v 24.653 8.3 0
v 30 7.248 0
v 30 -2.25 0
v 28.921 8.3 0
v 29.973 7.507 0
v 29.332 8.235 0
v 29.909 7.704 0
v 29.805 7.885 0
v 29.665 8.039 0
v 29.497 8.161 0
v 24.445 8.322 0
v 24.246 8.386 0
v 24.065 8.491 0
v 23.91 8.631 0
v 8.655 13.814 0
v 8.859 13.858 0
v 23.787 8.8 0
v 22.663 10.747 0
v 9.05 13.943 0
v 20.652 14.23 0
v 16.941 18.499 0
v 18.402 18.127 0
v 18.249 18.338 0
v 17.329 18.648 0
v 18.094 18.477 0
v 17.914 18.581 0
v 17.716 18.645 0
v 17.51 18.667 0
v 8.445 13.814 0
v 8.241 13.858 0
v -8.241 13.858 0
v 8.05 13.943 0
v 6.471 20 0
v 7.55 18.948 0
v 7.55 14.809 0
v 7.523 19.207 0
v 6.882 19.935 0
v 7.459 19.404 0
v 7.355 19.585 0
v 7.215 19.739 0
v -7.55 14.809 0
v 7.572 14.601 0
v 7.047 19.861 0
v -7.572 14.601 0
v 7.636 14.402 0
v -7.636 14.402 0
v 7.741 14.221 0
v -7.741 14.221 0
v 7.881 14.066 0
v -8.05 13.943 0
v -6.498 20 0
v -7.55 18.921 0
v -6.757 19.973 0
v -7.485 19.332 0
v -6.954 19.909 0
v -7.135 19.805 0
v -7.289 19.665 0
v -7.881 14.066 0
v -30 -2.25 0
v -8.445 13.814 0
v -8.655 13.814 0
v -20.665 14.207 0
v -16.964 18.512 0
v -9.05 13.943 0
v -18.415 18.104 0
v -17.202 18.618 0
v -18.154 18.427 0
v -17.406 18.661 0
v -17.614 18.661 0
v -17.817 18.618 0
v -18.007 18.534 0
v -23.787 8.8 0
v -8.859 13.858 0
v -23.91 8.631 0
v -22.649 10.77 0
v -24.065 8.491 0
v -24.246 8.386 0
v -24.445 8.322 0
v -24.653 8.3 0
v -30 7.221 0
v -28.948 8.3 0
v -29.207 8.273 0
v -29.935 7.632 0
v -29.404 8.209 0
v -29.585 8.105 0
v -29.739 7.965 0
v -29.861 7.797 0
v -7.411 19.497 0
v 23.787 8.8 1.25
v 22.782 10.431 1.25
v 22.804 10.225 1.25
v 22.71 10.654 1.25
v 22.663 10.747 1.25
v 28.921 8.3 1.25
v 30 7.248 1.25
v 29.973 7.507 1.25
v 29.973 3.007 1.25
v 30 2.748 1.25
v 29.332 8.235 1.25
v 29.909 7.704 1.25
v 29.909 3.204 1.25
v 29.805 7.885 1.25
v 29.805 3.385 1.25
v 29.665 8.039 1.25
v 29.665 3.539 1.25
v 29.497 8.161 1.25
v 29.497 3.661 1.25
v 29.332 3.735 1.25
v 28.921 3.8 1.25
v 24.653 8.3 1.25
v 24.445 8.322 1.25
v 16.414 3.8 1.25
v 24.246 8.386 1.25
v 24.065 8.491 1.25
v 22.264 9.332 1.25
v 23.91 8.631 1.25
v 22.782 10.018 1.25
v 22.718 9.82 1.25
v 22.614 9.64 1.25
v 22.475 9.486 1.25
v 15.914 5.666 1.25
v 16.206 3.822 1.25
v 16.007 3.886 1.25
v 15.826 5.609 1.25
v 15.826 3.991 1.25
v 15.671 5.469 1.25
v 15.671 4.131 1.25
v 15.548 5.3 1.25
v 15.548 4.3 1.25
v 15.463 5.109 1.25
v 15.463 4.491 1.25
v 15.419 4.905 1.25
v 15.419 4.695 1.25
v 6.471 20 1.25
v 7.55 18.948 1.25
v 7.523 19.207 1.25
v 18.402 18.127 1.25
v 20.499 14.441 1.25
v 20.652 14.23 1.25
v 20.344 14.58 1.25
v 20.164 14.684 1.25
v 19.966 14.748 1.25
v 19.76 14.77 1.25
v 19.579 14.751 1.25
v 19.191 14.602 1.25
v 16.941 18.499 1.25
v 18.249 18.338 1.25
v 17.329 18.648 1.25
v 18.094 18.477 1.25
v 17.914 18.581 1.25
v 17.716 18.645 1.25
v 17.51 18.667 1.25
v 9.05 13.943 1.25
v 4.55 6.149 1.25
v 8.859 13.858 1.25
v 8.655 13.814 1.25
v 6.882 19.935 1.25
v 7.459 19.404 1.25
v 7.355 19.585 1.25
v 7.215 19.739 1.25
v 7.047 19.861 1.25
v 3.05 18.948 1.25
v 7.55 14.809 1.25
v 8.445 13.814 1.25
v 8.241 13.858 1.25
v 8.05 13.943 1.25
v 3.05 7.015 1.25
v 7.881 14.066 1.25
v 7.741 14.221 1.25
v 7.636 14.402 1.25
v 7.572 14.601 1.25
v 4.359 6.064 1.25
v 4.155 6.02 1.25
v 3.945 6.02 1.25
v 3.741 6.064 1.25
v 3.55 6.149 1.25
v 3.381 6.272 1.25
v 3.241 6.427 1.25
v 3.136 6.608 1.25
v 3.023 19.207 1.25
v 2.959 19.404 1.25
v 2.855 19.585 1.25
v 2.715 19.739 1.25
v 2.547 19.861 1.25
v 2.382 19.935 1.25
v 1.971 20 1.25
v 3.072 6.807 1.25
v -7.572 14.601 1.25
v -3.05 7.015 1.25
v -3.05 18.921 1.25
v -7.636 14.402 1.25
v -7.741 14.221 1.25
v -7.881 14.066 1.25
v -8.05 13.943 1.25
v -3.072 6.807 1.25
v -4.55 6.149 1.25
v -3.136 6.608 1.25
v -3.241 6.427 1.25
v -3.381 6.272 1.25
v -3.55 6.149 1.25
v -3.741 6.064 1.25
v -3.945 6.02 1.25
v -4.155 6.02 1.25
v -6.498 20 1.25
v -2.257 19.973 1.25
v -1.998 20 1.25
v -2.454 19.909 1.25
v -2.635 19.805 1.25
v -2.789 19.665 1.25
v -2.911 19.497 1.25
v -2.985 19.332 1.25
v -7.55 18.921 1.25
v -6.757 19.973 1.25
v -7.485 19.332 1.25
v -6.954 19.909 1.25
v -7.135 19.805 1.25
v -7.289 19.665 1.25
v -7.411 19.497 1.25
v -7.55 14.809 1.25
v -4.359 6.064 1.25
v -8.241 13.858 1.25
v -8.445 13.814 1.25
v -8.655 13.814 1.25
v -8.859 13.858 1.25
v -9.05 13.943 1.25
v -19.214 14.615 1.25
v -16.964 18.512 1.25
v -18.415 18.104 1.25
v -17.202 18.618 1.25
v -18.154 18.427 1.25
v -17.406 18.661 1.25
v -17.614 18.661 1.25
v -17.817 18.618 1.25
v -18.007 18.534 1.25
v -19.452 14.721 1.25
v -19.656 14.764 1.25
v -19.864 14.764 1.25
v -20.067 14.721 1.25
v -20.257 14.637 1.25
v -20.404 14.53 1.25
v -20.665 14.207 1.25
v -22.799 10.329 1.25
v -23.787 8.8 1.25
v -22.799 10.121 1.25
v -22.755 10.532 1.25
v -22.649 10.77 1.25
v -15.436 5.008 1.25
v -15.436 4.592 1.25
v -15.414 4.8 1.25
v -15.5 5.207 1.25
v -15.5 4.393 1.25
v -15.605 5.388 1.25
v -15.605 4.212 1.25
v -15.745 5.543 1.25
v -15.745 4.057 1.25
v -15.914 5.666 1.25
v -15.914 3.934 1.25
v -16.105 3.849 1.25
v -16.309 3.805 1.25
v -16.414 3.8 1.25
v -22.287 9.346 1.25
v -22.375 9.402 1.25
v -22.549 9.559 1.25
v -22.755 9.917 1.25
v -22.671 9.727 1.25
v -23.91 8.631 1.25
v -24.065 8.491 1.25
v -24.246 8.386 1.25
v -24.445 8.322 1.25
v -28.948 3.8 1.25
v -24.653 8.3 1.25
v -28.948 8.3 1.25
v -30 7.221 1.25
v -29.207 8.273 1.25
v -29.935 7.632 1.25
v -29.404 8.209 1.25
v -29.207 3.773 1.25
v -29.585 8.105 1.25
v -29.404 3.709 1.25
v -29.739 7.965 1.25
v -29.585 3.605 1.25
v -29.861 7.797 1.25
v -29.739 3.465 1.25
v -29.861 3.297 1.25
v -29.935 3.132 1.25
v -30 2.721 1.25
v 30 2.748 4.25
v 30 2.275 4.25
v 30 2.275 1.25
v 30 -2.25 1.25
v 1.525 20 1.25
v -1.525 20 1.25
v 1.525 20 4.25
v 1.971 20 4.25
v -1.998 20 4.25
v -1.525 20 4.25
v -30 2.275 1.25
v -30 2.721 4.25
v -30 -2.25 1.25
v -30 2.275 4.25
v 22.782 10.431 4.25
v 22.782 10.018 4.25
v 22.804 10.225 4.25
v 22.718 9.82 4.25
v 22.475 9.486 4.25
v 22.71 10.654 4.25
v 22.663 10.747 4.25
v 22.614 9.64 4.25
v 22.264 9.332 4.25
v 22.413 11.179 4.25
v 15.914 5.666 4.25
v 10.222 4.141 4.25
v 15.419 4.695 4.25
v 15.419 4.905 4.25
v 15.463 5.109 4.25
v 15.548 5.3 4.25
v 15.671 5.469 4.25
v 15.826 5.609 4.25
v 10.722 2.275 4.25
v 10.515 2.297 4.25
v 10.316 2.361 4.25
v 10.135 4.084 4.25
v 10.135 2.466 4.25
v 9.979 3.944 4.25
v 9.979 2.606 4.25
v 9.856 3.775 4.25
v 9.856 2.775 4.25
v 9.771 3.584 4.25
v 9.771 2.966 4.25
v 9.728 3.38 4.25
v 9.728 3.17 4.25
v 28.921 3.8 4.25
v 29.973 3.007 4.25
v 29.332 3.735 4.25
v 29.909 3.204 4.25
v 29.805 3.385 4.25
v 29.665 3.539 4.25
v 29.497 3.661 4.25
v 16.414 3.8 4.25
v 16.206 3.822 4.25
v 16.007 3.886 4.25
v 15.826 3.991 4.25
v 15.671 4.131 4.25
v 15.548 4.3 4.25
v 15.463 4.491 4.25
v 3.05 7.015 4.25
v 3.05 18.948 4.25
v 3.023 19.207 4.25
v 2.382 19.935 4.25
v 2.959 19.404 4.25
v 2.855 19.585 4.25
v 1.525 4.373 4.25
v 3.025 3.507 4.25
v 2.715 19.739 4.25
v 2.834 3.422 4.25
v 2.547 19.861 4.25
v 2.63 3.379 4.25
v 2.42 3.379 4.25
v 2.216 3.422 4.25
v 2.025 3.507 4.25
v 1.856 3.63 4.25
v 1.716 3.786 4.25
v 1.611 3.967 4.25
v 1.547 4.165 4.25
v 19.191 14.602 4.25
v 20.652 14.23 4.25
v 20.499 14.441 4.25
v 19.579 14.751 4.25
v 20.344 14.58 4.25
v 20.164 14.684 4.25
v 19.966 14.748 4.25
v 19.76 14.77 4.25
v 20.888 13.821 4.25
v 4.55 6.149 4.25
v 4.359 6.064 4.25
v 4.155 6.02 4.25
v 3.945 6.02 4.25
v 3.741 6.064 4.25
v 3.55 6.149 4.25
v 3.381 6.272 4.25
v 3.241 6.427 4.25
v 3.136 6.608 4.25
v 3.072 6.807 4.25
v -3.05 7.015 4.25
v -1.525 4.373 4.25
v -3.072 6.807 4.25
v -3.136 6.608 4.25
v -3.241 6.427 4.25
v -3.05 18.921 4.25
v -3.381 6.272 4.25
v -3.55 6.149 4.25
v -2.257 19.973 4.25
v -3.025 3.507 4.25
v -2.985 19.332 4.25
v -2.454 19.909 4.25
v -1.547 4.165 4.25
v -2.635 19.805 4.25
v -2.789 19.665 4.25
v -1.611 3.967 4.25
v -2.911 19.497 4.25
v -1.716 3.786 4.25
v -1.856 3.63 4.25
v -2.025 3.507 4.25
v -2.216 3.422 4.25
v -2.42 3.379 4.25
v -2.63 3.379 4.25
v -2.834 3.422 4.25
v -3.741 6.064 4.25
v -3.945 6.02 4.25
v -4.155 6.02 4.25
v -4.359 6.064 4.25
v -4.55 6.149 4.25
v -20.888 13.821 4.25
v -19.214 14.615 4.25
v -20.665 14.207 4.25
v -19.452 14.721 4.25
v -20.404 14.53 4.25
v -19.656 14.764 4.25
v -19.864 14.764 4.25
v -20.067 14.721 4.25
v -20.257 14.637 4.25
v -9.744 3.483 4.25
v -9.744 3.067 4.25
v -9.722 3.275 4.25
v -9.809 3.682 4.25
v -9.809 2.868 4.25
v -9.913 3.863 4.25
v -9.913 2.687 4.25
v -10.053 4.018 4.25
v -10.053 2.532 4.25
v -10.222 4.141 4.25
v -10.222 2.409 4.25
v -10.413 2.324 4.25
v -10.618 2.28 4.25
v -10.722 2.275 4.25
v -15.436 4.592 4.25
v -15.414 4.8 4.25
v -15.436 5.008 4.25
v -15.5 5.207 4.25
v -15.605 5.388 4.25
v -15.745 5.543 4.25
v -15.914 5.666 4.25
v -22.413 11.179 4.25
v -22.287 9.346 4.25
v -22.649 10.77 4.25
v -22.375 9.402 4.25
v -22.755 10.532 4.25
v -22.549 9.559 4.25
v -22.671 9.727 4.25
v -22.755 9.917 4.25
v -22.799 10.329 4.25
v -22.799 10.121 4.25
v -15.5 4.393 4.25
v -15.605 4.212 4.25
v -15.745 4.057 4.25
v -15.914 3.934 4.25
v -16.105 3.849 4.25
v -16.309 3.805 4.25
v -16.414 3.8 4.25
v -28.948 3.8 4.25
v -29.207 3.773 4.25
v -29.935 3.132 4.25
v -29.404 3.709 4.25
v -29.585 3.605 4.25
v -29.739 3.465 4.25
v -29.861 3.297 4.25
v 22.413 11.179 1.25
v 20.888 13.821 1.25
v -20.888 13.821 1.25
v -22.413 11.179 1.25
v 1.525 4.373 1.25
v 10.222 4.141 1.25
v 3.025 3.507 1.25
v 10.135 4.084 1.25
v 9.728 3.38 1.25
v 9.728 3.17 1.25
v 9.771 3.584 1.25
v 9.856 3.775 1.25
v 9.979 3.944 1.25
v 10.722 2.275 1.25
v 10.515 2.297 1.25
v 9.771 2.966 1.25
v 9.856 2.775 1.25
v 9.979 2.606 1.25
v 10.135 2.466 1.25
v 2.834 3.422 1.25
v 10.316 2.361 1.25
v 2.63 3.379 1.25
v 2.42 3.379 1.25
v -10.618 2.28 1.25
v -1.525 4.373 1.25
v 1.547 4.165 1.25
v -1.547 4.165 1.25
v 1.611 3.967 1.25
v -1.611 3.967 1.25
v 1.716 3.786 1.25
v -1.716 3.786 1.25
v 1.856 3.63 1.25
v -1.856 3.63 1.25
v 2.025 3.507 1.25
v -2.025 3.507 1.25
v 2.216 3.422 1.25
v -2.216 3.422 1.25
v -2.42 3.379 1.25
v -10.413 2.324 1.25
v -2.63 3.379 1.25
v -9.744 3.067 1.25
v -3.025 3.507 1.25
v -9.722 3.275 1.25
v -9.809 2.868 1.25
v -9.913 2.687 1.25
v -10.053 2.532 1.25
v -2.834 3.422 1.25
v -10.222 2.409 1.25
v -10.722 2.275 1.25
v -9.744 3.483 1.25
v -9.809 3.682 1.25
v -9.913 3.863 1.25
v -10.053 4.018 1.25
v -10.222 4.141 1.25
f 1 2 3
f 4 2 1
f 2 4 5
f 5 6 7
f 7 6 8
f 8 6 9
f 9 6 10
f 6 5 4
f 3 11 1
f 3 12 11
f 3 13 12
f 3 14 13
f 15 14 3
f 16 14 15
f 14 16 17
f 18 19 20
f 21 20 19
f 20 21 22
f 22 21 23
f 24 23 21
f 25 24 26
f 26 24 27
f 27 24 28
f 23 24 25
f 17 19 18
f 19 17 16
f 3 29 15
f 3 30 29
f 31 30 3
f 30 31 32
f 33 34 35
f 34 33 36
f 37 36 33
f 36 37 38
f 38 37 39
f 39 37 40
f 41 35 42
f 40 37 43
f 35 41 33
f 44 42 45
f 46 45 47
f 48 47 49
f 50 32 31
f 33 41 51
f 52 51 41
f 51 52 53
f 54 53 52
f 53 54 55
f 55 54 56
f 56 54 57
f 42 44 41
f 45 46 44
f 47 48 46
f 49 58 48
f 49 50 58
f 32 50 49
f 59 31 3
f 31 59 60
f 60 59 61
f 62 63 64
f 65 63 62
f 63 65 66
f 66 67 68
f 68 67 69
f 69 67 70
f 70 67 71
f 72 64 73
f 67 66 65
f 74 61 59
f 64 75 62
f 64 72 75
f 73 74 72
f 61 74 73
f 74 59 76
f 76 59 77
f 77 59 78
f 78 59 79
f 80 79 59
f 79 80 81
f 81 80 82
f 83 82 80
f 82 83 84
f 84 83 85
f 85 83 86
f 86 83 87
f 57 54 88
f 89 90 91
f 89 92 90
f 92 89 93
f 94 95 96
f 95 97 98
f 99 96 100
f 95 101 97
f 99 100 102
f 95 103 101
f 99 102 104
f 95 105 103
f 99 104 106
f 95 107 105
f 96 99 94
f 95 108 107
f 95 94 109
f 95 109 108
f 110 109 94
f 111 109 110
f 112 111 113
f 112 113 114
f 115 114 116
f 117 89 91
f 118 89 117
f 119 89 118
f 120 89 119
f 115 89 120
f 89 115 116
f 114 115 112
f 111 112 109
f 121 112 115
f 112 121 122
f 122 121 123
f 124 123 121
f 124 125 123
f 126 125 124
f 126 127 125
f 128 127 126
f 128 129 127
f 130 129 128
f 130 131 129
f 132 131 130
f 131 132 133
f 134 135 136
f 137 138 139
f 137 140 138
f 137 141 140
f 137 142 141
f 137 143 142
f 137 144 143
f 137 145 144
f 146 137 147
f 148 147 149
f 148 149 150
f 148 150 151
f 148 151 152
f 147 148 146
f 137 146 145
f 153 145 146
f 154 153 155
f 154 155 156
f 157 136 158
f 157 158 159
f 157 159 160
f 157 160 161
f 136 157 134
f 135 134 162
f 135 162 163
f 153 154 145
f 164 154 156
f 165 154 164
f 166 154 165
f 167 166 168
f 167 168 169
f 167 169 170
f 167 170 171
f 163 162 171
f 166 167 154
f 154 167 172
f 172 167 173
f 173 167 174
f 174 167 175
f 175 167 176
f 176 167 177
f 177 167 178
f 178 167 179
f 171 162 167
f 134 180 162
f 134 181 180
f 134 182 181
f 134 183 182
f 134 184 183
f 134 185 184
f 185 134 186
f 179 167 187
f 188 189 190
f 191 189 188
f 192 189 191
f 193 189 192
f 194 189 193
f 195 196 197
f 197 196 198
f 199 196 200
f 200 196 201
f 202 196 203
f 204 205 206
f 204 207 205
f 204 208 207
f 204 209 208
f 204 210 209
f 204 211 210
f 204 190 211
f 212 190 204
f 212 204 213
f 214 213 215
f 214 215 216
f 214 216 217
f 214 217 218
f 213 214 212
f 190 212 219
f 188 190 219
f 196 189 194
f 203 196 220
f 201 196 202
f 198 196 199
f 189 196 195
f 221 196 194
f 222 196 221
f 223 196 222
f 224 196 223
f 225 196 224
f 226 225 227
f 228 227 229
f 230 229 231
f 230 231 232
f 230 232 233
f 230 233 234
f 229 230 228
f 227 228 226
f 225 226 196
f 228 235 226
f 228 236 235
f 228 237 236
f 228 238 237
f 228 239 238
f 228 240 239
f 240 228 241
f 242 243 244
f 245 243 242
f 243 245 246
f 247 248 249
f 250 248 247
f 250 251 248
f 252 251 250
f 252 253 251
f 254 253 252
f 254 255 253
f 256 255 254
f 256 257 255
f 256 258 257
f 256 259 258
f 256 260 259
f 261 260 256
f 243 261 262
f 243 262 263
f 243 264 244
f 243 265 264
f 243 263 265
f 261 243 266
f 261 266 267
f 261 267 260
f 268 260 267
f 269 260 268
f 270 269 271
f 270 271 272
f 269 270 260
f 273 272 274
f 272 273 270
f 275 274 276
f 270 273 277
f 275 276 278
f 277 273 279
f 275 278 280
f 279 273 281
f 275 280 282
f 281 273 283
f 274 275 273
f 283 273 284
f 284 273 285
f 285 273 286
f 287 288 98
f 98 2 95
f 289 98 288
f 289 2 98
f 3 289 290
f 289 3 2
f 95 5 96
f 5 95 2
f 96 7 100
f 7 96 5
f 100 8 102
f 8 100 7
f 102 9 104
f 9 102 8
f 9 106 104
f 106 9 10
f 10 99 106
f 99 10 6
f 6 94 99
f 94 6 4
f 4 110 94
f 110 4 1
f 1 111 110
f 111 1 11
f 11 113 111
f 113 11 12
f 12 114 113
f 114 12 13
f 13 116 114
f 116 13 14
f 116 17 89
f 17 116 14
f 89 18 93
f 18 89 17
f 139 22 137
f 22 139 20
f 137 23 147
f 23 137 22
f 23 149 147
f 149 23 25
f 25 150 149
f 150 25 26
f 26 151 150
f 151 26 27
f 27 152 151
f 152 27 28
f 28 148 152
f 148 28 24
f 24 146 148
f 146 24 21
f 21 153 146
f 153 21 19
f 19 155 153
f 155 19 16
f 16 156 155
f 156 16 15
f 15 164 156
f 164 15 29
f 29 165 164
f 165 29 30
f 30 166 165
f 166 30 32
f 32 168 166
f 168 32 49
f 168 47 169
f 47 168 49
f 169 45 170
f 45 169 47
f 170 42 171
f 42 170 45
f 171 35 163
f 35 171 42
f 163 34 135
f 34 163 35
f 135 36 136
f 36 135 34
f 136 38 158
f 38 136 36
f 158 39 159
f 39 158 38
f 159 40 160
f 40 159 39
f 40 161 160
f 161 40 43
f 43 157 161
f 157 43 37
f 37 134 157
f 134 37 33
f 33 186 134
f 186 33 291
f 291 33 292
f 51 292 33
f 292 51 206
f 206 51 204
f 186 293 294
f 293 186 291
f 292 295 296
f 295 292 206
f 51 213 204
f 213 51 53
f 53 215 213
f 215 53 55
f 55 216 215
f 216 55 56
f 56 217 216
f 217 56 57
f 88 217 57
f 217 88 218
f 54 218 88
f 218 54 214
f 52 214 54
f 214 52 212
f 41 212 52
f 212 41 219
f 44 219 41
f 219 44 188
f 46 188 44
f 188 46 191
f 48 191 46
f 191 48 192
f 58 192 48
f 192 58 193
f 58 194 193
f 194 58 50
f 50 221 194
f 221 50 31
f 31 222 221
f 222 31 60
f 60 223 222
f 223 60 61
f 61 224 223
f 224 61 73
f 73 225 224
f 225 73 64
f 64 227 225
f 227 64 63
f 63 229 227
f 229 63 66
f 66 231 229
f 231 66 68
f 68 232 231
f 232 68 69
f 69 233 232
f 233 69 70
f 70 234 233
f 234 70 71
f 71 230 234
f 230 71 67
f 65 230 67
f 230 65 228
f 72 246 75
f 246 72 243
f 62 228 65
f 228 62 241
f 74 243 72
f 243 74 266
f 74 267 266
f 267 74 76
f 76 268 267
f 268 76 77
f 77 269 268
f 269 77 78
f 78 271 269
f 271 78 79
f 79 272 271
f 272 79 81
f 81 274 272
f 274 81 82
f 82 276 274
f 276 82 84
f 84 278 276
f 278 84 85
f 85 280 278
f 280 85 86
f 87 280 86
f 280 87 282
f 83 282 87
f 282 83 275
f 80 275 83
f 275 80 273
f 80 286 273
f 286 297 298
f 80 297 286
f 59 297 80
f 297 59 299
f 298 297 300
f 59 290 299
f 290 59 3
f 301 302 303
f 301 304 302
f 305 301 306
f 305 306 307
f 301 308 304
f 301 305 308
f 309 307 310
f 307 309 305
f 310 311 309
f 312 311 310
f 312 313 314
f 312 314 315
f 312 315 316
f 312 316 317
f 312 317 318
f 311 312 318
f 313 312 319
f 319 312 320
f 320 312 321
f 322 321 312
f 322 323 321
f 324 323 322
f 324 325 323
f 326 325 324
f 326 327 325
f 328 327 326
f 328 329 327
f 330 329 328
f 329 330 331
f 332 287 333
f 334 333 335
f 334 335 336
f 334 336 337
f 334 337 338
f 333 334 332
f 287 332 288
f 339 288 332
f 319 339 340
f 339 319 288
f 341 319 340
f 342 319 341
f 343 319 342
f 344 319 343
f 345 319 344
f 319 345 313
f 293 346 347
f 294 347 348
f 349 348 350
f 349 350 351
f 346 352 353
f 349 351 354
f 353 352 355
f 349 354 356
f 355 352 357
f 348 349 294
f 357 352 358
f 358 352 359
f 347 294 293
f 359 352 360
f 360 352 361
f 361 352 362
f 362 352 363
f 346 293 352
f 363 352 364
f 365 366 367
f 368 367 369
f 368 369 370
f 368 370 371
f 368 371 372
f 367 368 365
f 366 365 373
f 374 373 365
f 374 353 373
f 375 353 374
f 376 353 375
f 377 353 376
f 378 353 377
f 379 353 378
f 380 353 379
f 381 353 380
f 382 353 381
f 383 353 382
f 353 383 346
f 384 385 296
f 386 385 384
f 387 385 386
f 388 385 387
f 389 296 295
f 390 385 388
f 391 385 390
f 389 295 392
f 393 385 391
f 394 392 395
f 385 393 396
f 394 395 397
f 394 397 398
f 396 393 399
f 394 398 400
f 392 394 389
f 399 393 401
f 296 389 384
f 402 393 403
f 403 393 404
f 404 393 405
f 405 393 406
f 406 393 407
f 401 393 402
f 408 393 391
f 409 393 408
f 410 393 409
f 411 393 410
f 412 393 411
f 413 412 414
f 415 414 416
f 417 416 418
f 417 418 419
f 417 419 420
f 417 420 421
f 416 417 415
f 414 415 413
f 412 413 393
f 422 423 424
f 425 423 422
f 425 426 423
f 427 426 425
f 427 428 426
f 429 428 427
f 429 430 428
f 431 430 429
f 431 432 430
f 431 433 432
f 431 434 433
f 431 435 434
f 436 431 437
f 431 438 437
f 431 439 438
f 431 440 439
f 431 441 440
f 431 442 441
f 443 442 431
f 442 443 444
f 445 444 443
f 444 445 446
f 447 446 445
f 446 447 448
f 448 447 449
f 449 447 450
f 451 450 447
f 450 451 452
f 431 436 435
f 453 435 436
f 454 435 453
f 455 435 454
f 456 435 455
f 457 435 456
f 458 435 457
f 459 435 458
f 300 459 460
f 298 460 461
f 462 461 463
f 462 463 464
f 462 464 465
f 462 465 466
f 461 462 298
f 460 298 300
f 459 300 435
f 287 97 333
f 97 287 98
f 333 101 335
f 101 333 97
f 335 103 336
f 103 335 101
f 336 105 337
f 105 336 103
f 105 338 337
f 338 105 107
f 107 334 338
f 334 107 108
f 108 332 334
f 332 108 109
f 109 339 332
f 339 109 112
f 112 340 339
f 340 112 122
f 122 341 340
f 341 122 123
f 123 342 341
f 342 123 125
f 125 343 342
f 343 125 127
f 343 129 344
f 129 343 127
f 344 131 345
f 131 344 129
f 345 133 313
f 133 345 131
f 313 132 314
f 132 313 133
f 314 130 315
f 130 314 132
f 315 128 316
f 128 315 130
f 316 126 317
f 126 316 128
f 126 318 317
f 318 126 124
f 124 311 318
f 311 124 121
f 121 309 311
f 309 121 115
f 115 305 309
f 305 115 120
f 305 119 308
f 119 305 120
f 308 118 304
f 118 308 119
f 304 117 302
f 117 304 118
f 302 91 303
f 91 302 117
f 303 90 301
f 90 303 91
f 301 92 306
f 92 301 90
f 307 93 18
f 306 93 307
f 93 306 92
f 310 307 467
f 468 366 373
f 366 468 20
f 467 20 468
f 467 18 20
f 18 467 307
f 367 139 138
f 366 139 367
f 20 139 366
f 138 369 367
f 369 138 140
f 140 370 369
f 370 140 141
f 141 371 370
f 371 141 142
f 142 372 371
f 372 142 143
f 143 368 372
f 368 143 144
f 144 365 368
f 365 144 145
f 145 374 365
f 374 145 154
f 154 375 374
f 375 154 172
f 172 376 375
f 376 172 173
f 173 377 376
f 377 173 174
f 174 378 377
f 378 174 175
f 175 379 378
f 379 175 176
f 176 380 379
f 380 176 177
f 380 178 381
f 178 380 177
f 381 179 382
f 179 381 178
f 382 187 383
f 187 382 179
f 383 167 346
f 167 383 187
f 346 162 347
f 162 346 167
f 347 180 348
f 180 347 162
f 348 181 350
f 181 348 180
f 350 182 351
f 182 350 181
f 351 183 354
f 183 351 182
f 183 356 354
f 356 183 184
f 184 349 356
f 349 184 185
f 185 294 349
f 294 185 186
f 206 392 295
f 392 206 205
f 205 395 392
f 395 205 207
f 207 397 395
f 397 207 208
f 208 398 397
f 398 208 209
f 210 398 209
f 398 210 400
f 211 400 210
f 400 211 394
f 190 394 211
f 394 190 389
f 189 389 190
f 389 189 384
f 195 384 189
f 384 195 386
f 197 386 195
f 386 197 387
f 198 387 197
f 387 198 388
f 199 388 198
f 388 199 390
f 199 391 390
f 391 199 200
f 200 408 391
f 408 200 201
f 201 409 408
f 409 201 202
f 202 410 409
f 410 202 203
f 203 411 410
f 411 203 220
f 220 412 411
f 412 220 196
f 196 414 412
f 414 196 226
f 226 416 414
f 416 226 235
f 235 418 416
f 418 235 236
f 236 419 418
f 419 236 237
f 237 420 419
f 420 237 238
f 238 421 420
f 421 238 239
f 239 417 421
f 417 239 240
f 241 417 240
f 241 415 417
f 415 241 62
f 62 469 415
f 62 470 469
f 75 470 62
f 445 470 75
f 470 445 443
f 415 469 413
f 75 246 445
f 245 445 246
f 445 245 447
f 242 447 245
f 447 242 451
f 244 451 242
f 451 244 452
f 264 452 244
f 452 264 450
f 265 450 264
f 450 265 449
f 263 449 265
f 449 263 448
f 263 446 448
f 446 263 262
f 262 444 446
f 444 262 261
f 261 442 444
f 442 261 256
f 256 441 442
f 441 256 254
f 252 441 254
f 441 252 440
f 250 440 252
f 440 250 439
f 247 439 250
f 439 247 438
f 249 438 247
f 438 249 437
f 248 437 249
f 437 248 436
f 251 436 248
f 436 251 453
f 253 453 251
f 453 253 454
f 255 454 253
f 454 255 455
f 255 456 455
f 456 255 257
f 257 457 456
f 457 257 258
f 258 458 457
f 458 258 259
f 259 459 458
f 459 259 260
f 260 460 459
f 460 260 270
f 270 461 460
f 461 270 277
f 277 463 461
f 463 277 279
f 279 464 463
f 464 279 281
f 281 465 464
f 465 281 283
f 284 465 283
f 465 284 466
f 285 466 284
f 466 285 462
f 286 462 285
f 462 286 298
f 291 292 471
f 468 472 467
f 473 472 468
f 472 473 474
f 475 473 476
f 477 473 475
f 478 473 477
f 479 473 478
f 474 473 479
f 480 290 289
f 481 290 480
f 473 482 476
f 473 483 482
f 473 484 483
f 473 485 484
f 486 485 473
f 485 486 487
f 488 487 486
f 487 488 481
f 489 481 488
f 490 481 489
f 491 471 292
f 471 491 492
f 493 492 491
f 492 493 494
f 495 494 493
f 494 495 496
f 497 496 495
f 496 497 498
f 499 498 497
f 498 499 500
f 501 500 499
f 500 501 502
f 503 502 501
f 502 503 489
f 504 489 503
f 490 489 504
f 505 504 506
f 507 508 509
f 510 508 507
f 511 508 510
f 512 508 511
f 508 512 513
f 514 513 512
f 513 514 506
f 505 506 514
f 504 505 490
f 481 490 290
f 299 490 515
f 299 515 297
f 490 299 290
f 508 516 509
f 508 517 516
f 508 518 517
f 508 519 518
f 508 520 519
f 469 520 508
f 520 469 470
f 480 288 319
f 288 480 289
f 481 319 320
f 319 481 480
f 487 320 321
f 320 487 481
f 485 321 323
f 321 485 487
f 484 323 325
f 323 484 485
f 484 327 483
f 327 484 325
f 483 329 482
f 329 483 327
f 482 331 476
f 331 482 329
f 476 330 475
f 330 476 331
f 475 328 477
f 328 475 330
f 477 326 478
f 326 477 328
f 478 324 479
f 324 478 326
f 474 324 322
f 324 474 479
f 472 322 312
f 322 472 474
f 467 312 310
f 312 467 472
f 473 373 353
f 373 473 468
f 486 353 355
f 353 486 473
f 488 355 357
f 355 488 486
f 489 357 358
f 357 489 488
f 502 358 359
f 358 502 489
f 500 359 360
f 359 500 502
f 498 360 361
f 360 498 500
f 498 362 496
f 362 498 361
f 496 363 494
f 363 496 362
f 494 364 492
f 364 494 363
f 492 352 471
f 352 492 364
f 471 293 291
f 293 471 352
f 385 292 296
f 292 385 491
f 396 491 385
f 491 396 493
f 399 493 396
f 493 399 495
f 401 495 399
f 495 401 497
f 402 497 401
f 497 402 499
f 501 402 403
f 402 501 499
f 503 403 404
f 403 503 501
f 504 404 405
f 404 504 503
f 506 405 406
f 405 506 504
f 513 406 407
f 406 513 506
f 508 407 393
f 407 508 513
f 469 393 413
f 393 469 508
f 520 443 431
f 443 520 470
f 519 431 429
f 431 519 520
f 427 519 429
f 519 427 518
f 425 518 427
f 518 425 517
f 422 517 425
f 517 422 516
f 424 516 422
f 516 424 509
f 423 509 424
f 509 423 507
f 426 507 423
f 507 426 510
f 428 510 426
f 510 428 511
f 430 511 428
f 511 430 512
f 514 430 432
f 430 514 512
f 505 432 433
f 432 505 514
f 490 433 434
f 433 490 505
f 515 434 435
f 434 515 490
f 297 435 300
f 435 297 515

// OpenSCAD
/*
 * Configurable Strut Bracket
 *
 * by 4iqvmk, 2018-12-08
 * https://www.thingiverse.com/4iqvmk/about
 * 
 * Licenced under Creative Commons Attribution - Share Alike 4.0 
 *
 * version 1.00 - initial version
*/

/* [Hidden] */

inch2mm = 0.3048/12*1000;
mm2inch = 12/0.3048/1000;
$fn=30;

/* [Parameters] */

// mm
flangeThickness = 1.25;

// mm
flangeWidth = 6;

// mm
filletRadius = 2;

// mm
surroundHeight = 3.0;

// mm
surroundWidth = 1.5;

// mm
offsetDistance = 0;

// mm
tolerance = 0.05; // [0:0.01:0.2]

maskEdge = 1;  // [0: false, 1: true]

/* [Beam Angles] */

// deg, or -1 to disable
beam1Angle = 0;

// deg, or -1 to disable
beam2Angle = 30;

// deg, or -1 to disable
beam3Angle = 90;

// deg, or -1 to disable
beam4Angle = 150;

// deg, or -1 to disable
beam5Angle = 180;

// deg, or -1 to disable
beam6Angle = -1;

// deg, or -1 to disable
beam7Angle = -1;

// deg, or -1 to disable
beam8Angle = -1;

/* [Beam Widths] */

// mm, or -1 to disable
beam1Width = 4.5;

// mm, or -1 to disable
beam2Width = 3;

// mm, or -1 to disable
beam3Width = 3;

// mm, or -1 to disable
beam4Width = 3;

// mm, or -1 to disable
beam5Width = 4.5;

// mm, or -1 to disable
beam6Width = 3;

// mm, or -1 to disable
beam7Width = 3;

// mm, or -1 to disable
beam8Width = 3;


/* [Flange Lengths] */

// mm, or -1 to disable
beam1Length = 30;

// mm, or -1 to disable
beam2Length = 25;

// mm, or -1 to disable
beam3Length = 20;

// mm, or -1 to disable
beam4Length = 25;

// mm, or -1 to disable
beam5Length = 30;

// mm, or -1 to disable
beam6Length = 30;

// mm, or -1 to disable
beam7Length = 30;

// mm, or -1 to disable
beam8Length = 30;

/* [Hidden] */

/////////////////////////////////////////////////////////////////////////////
// Calculated values... 
/////////////////////////////////////////////////////////////////////////////
allAngles = [beam1Angle, beam2Angle, beam3Angle, beam4Angle, beam5Angle, beam6Angle, beam7Angle, beam8Angle];
allWidths = [beam1Width, beam2Width, beam3Width, beam4Width, beam5Width, beam6Width, beam7Width, beam8Width];
allLengths = [beam1Length, beam2Length, beam3Length, beam4Length, beam5Length, beam6Length, beam7Length, beam8Length];

makeTruss(allAngles, allWidths, allLengths, flangeThickness, flangeWidth, filletRadius, surroundHeight, surroundWidth, offsetDistance, tolerance, maskEdge);


module makeTruss(allAngles, allWidths, allLengths, flangeThk, flangeWid, filletRad, surroundHgt, surroundWid, offsetDist, tol, maskEdge) {
    
    iBeam = [ for (k = [0:len(allAngles)-1]) (allAngles[k]>=0 && allWidths[k] > 0 && allLengths[k] > 0) ? true : false ];
        
    beamAngles = [ for (k = [0:len(allAngles)-1]) if (iBeam[k]) allAngles[k]];
    beamWidths = [ for (k = [0:len(allAngles)-1]) if (iBeam[k]) allWidths[k]];
    beamLengths = [ for (k = [0:len(allLengths)-1]) if (iBeam[k]) allLengths[k]];

    nBeams = len(beamAngles);

    beams = [ for (k=[0:nBeams-1]) [beamAngles[k], beamWidths[k], beamLengths[k]] ];

    fullBeams = [ for (k=[0:nBeams-1]) [beamAngles[k], beamWidths[k]+2*flangeWid+2*tol, beamLengths[k]] ];
        
    fullSurround = [ for (k=[0:nBeams-1]) [beamAngles[k], beamWidths[k] + 2*surroundWid + 2*tol, beamLengths[k]] ];

    iMin = index_min(beamAngles);
    iMax = index_max(beamAngles);

    beamA = beams[iMin];
    beamB = beams[iMax];

    maxLength = max(beamLengths);
    maxWidth = max(beamWidths);

    difference() {
        
        union() {
        
            if (maskEdge) {
                union() {
                    difference() {
                        makeFlange(fullBeams, flangeThk, filletRad);
                        outerMask(beamA, beamB, filletRad, offsetDist, maxLength, flangeThk, surroundHgt, maxWidth*1.5);
                    }
                    difference() {
                        makeFlange(fullSurround, flangeThk+surroundHgt, filletRad);
                        outerMask(beamA, beamB, filletRad, min(offsetDist,0), maxLength, flangeThk, surroundHgt, maxWidth*1.5);
                    }
                }
            } else {
                makeFlange(fullBeams, flangeThk, filletRad);
                makeFlange(fullSurround, flangeThk+surroundHgt, filletRad);
            }
        }

        makeBeamMask(beams, flangeThk, surroundHgt, filletRad, tol);
    }
}

module makeFlange(beam, height, filletRad) {
    linear_extrude(height = height) {
        soften_profile(radius=filletRad) {
            union() {
                for (k = [0:len(beam)-1]) {
                    flangeLeg(beam[k]);
                }
            }
        }
    }
}


module makeBeamMask(beam, flangeT, surroundH, filletR, tol) {
    translate([0, 0, flangeT]) {
        linear_extrude(height = 2*surroundH) {
            soften_profile(radius=filletR) {
                union() {
                    for (k = [0:len(beam)-1]) {
                        beamMask(beam[k], tol);
                    }
                }
            }
        }
    }
}


module flangeLeg(b) {
    
    angle = b[0];
    width = b[1];
    length = b[2];
    
    if (angle>=0) {
        rotate(a=angle, v=[0,0,1]) {
            union() {
                translate([length/2, 0, 0]) {
                    square([length, width], true);
                }
                circle(r=width/2);
            }
        }
    }
}


module beamMask(b, tol) {

    angle = b[0];
    width = b[1];
    length = b[2];

    if (angle>=0) {
        rotate(a=angle, v=[0,0,1]) {
            union() {
                translate([length, 0, 0]) {
                    square([length*2, width+tol], true);
                }
                circle(r=width/2);
            }
        }
    }
}


// remove the outside edge if selected
module outerMask(beamA, beamB, rad, off, maxLength, flangeT, surroundH, filletR) {

    r = 2*maxLength;
    n = 16;
    
    maxHeight = flangeT + surroundH;
    
    // angle half way from beamB around to beamA
    intAngle = wrap(0.5 * wrap360(beamA[0] - beamB[0]) + beamB[0]);
    
    // shift distance for mask
    
    linear_extrude(height = 4*maxHeight, center=true) {
    
        soften_profile(radius=filletR) {
            union() {

                dxyA = (beamA[1]/2 + off) / abs(sin(0.5*wrap(beamA[0] - beamB[0])));

                dxyB = (beamB[1]/2 + off) / abs(sin(0.5*wrap(beamA[0] - beamB[0])));

                translate([dxyA*cos(intAngle), dxyA*sin(intAngle), 0]) {
                    
                    for (k=[0:n-1]) {
                        
                        // intermediate angles from beamB around to beamA in n increments
                        intAngle0 = wrap(k/n * (wrap360(beamA[0] - intAngle)) + intAngle);
                        intAngle1 = wrap((k+1)/n * (wrap360(beamA[0] - intAngle)) + intAngle);
                        
                        polygon(points = [ [0,0], [r*cos(intAngle0), r*sin(intAngle0)], [r*cos(intAngle1), r*sin(intAngle1)],  [0,0]]);
                    }
                }
                translate([dxyB*cos(intAngle), dxyB*sin(intAngle), 0]) {
                    
                    for (k=[0:n-1]) {
                        
                        // intermediate angles from beamB around to beamA in n increments
                        intAngle0 = wrap(k/n * (wrap360(intAngle - beamB[0])) + beamB[0]);
                        intAngle1 = wrap((k+1)/n * (wrap360(intAngle - beamB[0])) + beamB[0]);
                        
                        polygon(points = [ [0,0], [r*cos(intAngle0), r*sin(intAngle0)], [r*cos(intAngle1), r*sin(intAngle1)],  [0,0]]);
                    }
                }
            }
        }
    }
}


function wrap(a) = atan2(sin(a), cos(a));


function wrap360(a) = wrap(a) - 360*floor(wrap(a)/360);


function index_min(x) = search(min(x), x)[0];


function index_max(x) = search(max(x), x)[0];


module soften_profile(radius) {
    offset(r=-0.5*radius) {
        offset(r=1.0*radius) {
            offset(r=-0.5*radius) {
                children();
            }
        }
    }
}
